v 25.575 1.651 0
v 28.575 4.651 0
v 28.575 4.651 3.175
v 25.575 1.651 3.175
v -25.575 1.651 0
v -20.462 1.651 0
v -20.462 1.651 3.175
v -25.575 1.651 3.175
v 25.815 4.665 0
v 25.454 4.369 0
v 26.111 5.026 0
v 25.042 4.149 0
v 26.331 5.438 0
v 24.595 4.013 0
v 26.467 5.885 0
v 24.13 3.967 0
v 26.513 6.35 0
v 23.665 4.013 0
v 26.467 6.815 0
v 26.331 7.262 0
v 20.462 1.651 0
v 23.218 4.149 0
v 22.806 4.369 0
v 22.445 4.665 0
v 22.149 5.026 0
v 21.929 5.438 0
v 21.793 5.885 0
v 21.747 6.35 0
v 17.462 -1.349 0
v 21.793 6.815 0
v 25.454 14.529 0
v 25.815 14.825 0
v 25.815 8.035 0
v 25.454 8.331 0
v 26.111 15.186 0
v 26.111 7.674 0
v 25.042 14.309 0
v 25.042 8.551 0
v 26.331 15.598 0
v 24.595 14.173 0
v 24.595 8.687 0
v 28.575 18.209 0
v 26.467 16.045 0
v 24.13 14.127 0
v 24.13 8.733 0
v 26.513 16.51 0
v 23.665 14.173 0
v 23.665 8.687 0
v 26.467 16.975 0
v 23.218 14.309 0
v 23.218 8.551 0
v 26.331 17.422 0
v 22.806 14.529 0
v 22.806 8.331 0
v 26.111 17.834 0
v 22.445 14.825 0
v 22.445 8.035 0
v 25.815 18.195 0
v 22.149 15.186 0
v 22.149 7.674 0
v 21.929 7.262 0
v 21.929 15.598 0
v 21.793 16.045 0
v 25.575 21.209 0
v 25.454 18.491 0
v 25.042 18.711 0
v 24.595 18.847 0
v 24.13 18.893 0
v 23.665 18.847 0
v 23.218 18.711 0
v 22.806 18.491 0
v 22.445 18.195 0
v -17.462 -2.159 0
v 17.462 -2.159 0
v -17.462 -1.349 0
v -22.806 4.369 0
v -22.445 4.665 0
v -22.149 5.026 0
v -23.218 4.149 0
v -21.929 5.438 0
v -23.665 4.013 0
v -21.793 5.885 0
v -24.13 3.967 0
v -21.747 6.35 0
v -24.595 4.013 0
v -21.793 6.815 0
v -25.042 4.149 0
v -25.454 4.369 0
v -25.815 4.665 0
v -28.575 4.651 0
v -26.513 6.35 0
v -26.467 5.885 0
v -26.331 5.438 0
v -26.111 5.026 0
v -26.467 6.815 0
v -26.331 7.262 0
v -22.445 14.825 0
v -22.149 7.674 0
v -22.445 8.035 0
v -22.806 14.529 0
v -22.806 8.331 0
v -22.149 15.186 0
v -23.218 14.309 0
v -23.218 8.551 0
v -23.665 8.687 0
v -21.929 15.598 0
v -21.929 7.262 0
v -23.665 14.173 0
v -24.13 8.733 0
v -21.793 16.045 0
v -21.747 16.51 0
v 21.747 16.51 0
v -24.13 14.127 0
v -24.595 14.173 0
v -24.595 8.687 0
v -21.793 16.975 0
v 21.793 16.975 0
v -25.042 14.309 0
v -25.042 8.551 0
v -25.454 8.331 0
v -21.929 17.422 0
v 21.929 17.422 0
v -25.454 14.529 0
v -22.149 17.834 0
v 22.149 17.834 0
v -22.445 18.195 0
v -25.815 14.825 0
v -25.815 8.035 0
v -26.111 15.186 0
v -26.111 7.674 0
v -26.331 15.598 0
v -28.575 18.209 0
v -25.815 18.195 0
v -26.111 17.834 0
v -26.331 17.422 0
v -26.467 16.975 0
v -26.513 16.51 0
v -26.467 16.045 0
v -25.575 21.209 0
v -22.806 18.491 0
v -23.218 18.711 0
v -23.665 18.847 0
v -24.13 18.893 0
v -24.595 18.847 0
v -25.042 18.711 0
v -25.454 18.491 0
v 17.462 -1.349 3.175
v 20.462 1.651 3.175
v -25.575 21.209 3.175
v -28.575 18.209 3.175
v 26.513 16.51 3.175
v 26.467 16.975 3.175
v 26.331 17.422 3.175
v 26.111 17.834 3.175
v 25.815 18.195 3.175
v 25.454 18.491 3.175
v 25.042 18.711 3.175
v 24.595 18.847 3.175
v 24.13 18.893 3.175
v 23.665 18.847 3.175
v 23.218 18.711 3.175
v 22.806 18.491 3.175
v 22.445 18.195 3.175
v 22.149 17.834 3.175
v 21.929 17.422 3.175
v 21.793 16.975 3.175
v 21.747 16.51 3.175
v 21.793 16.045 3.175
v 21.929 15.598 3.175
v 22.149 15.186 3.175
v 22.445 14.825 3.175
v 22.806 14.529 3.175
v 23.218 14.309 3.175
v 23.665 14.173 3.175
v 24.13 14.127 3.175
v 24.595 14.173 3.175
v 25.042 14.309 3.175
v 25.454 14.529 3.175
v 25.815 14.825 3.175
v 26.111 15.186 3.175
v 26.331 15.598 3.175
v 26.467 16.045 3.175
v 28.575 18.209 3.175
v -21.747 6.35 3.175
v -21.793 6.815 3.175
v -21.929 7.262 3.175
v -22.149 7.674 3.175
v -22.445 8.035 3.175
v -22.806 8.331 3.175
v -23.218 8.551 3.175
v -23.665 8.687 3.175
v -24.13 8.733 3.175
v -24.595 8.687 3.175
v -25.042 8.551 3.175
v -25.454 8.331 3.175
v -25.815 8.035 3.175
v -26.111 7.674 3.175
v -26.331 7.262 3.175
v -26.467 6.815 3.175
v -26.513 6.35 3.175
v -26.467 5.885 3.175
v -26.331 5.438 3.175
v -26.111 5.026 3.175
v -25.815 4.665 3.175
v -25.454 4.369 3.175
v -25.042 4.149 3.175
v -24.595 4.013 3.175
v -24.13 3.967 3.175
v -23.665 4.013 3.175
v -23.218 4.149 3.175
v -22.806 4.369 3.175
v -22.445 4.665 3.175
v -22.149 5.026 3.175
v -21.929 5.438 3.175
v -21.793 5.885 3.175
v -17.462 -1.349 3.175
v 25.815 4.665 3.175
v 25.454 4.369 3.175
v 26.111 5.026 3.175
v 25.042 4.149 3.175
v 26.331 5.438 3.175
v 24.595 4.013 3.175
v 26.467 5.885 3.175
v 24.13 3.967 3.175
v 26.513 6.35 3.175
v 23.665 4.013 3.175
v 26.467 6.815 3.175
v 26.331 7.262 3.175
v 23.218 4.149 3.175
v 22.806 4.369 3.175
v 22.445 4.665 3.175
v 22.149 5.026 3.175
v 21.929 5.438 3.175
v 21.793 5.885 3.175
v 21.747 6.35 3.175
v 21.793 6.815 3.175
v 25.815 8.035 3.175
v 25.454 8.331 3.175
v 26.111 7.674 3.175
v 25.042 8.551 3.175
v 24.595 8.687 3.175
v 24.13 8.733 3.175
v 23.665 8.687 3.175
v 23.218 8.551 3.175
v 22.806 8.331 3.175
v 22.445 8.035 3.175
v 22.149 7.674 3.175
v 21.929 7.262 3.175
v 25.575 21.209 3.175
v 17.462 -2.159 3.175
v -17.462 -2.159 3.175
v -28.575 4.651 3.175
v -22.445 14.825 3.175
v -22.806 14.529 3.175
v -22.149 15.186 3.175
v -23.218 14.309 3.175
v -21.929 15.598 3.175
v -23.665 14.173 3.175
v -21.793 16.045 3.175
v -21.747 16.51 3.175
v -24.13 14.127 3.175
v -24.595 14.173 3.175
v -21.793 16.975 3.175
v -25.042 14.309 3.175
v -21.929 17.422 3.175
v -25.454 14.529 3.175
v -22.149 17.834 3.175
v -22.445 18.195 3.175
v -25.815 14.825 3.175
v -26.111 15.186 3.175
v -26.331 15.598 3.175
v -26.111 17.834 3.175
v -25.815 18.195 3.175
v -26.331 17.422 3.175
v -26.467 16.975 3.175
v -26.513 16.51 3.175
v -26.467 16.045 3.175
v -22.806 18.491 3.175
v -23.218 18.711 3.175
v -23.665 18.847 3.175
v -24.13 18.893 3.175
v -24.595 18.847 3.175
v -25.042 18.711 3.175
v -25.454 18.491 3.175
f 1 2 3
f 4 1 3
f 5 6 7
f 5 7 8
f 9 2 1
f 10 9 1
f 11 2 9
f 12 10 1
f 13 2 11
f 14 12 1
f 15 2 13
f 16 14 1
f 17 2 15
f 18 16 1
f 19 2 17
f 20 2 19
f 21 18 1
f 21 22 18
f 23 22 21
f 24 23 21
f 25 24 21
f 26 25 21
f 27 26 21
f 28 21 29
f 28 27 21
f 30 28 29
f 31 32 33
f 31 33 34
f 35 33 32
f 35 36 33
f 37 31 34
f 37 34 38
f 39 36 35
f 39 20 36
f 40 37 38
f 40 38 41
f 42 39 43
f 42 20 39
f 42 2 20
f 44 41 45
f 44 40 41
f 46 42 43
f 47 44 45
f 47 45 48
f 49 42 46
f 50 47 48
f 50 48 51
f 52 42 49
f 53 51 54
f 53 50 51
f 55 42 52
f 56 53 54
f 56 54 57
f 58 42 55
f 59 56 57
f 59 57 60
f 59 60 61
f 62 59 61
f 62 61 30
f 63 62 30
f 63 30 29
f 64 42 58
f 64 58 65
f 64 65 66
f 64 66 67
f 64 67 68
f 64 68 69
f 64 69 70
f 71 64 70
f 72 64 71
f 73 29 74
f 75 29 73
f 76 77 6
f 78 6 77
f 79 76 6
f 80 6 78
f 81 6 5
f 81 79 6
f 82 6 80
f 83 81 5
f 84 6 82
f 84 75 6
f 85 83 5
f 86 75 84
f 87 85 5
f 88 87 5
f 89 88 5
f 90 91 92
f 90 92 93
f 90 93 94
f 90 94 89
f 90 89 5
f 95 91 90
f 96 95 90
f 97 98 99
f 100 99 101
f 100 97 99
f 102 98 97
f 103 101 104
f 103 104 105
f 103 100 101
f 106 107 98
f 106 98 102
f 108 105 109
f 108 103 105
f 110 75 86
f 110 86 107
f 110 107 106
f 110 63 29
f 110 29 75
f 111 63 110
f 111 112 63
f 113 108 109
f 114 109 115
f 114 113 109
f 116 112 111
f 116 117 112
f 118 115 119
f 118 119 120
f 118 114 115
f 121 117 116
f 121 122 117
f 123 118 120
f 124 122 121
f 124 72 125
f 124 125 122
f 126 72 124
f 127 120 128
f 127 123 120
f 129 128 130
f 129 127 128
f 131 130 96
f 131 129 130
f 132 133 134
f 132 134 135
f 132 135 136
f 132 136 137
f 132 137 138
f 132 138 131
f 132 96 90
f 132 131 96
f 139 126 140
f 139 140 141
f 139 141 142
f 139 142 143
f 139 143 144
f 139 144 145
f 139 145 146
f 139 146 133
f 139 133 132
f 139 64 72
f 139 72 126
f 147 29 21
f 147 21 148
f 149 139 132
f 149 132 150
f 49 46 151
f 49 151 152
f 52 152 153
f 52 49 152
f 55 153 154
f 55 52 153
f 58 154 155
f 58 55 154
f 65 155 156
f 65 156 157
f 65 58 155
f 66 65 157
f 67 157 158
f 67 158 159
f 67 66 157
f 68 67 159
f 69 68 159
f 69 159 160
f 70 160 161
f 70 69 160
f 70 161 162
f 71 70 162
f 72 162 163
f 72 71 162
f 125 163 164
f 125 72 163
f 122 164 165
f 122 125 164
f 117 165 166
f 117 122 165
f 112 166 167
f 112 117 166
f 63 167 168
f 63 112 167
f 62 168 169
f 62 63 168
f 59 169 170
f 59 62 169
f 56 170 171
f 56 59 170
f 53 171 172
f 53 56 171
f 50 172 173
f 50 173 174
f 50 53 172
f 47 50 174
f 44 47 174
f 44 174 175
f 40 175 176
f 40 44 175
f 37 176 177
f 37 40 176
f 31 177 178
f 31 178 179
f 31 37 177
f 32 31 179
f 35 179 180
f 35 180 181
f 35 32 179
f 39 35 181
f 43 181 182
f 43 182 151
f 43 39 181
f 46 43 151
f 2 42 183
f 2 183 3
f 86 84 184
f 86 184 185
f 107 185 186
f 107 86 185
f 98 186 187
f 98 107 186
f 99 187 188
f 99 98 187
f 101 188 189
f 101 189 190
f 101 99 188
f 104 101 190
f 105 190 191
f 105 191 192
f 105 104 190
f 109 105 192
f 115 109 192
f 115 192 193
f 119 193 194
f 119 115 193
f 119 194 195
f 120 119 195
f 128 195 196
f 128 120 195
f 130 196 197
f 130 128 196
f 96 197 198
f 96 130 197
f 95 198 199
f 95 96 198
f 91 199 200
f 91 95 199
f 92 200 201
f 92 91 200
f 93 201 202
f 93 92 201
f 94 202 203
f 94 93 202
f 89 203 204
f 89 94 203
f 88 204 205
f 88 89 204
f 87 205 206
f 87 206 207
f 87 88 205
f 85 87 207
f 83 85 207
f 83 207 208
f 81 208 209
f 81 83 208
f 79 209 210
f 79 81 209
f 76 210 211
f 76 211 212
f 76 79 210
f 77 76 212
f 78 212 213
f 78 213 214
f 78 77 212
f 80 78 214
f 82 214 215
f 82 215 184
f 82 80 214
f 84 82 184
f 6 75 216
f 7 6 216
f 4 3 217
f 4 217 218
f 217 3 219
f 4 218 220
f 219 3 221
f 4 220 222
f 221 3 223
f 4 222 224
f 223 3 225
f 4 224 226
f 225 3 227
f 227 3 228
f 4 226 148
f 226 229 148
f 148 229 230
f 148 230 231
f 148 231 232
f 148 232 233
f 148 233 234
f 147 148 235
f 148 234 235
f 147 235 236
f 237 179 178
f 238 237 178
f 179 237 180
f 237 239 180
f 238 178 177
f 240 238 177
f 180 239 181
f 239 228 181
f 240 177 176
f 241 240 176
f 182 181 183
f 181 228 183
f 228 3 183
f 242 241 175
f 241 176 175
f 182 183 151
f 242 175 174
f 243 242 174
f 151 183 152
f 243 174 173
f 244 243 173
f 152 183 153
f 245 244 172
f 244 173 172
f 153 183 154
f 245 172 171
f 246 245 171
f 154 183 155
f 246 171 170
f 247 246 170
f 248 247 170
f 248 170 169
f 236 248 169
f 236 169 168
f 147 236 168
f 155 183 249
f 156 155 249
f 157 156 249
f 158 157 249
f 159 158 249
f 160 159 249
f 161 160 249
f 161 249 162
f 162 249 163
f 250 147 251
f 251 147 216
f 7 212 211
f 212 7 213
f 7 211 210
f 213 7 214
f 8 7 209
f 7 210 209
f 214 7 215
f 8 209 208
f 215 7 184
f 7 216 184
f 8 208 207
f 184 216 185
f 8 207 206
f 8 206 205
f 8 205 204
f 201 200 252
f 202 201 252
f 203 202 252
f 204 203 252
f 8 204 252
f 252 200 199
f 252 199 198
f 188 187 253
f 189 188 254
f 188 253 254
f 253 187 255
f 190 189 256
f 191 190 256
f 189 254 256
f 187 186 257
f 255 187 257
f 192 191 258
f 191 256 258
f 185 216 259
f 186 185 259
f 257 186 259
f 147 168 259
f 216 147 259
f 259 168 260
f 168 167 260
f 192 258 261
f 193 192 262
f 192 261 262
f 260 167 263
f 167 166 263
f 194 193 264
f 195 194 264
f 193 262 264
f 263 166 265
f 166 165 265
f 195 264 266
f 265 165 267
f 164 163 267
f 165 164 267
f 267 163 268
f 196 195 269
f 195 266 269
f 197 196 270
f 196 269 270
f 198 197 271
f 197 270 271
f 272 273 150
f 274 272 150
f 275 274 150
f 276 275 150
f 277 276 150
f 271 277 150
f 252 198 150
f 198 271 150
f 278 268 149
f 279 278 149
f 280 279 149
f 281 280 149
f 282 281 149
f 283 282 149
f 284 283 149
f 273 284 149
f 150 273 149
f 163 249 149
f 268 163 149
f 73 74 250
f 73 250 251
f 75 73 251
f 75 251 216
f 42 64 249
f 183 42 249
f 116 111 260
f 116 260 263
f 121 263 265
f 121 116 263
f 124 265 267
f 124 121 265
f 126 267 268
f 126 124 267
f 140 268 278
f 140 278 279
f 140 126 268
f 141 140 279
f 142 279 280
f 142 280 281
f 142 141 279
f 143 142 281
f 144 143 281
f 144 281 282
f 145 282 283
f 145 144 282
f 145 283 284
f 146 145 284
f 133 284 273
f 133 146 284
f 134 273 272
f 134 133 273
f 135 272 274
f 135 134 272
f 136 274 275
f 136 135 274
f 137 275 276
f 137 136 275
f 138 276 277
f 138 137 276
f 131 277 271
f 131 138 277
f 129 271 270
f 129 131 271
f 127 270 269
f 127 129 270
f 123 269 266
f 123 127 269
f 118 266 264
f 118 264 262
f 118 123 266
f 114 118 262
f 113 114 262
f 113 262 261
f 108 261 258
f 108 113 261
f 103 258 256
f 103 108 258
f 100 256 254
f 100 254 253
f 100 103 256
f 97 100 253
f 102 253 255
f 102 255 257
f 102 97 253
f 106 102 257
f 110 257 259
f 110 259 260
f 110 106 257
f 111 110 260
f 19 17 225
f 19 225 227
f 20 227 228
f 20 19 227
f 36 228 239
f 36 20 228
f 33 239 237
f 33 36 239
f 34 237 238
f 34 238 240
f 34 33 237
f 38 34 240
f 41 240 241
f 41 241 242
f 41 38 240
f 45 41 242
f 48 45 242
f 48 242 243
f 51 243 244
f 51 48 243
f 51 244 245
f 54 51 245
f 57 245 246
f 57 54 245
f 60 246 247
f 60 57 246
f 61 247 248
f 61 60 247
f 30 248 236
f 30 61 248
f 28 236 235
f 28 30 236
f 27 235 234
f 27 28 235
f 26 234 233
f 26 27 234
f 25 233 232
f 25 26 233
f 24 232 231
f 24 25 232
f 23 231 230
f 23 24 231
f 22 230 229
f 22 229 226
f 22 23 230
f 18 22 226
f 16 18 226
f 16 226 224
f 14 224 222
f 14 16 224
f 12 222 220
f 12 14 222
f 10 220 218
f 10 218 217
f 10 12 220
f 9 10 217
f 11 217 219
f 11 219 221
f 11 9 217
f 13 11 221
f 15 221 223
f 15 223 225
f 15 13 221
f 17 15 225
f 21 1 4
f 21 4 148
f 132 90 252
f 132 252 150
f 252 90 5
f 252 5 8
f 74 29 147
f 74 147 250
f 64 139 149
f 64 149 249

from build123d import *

# Parameters (mm, degrees)
SKETCH1_R           = 3.475
SKETCH1_R_2         = 2.3828
BOSS_EXTRUDE1_DEPTH = 3.175
CHAMFER1_SIZE       = 3
CHAMFER2_SIZE       = 3
SKETCH2_W           = 36.09329734
SKETCH2_H           = 19.05
CUT_EXTRUDE1_DEPTH  = 36.727201556


with BuildPart() as part:
    # Sketch1 → Boss-Extrude1 (new body)
    with BuildSketch(Plane.XY):
        Polygon((17.4625, -21.209), (-17.4625, -21.209), (-17.4625, 1.651), (-28.575, 1.651), (-28.575, 21.209), (28.575, 21.209), (28.575, 1.651), (17.4625, 1.651), align=None)
        with Locations((-9.525, -10.541)):
            Circle(SKETCH1_R, mode=Mode.SUBTRACT)
        with Locations((9.525, -10.541)):
            Circle(SKETCH1_R, mode=Mode.SUBTRACT)
        with Locations((-24.13, 6.35)):
            Circle(SKETCH1_R_2, mode=Mode.SUBTRACT)
        with Locations((-24.13, 16.51)):
            Circle(SKETCH1_R_2, mode=Mode.SUBTRACT)
        with Locations((24.13, 16.51)):
            Circle(SKETCH1_R_2, mode=Mode.SUBTRACT)
        with Locations((24.13, 6.35)):
            Circle(SKETCH1_R_2, mode=Mode.SUBTRACT)
    extrude(amount=BOSS_EXTRUDE1_DEPTH)

    # Chamfer1
    chamfer1_edges = [part.edges().sort_by_distance(p)[0] for p in [
        (-28.575, 1.651, 1.5875),
        (-28.575, 21.209, 1.5875),
        (28.575, 21.209, 1.5875),
        (28.575, 1.651, 1.5875),
    ]]
    chamfer(chamfer1_edges, length=CHAMFER1_SIZE)

    # Chamfer2
    chamfer2_edges = [part.edges().sort_by_distance(p)[0] for p in [
        (17.4625, 1.651, 1.5875),
        (17.4625, -21.209, 1.5875),
        (-17.4625, -21.209, 1.5875),
        (-17.4625, 1.651, 1.5875),
    ]]
    chamfer(chamfer2_edges, length=CHAMFER2_SIZE)

    # Sketch2 → Cut-Extrude1 (cut, through all)
    with BuildSketch(Plane(origin=(0, 0, 0), x_dir=(-1, 0, 0), z_dir=(0, 0, -1))):
        with Locations((0.32904128, -11.684)):
            Rectangle(SKETCH2_W, SKETCH2_H)
    extrude(amount=-CUT_EXTRUDE1_DEPTH, mode=Mode.SUBTRACT)


solid = part.part
